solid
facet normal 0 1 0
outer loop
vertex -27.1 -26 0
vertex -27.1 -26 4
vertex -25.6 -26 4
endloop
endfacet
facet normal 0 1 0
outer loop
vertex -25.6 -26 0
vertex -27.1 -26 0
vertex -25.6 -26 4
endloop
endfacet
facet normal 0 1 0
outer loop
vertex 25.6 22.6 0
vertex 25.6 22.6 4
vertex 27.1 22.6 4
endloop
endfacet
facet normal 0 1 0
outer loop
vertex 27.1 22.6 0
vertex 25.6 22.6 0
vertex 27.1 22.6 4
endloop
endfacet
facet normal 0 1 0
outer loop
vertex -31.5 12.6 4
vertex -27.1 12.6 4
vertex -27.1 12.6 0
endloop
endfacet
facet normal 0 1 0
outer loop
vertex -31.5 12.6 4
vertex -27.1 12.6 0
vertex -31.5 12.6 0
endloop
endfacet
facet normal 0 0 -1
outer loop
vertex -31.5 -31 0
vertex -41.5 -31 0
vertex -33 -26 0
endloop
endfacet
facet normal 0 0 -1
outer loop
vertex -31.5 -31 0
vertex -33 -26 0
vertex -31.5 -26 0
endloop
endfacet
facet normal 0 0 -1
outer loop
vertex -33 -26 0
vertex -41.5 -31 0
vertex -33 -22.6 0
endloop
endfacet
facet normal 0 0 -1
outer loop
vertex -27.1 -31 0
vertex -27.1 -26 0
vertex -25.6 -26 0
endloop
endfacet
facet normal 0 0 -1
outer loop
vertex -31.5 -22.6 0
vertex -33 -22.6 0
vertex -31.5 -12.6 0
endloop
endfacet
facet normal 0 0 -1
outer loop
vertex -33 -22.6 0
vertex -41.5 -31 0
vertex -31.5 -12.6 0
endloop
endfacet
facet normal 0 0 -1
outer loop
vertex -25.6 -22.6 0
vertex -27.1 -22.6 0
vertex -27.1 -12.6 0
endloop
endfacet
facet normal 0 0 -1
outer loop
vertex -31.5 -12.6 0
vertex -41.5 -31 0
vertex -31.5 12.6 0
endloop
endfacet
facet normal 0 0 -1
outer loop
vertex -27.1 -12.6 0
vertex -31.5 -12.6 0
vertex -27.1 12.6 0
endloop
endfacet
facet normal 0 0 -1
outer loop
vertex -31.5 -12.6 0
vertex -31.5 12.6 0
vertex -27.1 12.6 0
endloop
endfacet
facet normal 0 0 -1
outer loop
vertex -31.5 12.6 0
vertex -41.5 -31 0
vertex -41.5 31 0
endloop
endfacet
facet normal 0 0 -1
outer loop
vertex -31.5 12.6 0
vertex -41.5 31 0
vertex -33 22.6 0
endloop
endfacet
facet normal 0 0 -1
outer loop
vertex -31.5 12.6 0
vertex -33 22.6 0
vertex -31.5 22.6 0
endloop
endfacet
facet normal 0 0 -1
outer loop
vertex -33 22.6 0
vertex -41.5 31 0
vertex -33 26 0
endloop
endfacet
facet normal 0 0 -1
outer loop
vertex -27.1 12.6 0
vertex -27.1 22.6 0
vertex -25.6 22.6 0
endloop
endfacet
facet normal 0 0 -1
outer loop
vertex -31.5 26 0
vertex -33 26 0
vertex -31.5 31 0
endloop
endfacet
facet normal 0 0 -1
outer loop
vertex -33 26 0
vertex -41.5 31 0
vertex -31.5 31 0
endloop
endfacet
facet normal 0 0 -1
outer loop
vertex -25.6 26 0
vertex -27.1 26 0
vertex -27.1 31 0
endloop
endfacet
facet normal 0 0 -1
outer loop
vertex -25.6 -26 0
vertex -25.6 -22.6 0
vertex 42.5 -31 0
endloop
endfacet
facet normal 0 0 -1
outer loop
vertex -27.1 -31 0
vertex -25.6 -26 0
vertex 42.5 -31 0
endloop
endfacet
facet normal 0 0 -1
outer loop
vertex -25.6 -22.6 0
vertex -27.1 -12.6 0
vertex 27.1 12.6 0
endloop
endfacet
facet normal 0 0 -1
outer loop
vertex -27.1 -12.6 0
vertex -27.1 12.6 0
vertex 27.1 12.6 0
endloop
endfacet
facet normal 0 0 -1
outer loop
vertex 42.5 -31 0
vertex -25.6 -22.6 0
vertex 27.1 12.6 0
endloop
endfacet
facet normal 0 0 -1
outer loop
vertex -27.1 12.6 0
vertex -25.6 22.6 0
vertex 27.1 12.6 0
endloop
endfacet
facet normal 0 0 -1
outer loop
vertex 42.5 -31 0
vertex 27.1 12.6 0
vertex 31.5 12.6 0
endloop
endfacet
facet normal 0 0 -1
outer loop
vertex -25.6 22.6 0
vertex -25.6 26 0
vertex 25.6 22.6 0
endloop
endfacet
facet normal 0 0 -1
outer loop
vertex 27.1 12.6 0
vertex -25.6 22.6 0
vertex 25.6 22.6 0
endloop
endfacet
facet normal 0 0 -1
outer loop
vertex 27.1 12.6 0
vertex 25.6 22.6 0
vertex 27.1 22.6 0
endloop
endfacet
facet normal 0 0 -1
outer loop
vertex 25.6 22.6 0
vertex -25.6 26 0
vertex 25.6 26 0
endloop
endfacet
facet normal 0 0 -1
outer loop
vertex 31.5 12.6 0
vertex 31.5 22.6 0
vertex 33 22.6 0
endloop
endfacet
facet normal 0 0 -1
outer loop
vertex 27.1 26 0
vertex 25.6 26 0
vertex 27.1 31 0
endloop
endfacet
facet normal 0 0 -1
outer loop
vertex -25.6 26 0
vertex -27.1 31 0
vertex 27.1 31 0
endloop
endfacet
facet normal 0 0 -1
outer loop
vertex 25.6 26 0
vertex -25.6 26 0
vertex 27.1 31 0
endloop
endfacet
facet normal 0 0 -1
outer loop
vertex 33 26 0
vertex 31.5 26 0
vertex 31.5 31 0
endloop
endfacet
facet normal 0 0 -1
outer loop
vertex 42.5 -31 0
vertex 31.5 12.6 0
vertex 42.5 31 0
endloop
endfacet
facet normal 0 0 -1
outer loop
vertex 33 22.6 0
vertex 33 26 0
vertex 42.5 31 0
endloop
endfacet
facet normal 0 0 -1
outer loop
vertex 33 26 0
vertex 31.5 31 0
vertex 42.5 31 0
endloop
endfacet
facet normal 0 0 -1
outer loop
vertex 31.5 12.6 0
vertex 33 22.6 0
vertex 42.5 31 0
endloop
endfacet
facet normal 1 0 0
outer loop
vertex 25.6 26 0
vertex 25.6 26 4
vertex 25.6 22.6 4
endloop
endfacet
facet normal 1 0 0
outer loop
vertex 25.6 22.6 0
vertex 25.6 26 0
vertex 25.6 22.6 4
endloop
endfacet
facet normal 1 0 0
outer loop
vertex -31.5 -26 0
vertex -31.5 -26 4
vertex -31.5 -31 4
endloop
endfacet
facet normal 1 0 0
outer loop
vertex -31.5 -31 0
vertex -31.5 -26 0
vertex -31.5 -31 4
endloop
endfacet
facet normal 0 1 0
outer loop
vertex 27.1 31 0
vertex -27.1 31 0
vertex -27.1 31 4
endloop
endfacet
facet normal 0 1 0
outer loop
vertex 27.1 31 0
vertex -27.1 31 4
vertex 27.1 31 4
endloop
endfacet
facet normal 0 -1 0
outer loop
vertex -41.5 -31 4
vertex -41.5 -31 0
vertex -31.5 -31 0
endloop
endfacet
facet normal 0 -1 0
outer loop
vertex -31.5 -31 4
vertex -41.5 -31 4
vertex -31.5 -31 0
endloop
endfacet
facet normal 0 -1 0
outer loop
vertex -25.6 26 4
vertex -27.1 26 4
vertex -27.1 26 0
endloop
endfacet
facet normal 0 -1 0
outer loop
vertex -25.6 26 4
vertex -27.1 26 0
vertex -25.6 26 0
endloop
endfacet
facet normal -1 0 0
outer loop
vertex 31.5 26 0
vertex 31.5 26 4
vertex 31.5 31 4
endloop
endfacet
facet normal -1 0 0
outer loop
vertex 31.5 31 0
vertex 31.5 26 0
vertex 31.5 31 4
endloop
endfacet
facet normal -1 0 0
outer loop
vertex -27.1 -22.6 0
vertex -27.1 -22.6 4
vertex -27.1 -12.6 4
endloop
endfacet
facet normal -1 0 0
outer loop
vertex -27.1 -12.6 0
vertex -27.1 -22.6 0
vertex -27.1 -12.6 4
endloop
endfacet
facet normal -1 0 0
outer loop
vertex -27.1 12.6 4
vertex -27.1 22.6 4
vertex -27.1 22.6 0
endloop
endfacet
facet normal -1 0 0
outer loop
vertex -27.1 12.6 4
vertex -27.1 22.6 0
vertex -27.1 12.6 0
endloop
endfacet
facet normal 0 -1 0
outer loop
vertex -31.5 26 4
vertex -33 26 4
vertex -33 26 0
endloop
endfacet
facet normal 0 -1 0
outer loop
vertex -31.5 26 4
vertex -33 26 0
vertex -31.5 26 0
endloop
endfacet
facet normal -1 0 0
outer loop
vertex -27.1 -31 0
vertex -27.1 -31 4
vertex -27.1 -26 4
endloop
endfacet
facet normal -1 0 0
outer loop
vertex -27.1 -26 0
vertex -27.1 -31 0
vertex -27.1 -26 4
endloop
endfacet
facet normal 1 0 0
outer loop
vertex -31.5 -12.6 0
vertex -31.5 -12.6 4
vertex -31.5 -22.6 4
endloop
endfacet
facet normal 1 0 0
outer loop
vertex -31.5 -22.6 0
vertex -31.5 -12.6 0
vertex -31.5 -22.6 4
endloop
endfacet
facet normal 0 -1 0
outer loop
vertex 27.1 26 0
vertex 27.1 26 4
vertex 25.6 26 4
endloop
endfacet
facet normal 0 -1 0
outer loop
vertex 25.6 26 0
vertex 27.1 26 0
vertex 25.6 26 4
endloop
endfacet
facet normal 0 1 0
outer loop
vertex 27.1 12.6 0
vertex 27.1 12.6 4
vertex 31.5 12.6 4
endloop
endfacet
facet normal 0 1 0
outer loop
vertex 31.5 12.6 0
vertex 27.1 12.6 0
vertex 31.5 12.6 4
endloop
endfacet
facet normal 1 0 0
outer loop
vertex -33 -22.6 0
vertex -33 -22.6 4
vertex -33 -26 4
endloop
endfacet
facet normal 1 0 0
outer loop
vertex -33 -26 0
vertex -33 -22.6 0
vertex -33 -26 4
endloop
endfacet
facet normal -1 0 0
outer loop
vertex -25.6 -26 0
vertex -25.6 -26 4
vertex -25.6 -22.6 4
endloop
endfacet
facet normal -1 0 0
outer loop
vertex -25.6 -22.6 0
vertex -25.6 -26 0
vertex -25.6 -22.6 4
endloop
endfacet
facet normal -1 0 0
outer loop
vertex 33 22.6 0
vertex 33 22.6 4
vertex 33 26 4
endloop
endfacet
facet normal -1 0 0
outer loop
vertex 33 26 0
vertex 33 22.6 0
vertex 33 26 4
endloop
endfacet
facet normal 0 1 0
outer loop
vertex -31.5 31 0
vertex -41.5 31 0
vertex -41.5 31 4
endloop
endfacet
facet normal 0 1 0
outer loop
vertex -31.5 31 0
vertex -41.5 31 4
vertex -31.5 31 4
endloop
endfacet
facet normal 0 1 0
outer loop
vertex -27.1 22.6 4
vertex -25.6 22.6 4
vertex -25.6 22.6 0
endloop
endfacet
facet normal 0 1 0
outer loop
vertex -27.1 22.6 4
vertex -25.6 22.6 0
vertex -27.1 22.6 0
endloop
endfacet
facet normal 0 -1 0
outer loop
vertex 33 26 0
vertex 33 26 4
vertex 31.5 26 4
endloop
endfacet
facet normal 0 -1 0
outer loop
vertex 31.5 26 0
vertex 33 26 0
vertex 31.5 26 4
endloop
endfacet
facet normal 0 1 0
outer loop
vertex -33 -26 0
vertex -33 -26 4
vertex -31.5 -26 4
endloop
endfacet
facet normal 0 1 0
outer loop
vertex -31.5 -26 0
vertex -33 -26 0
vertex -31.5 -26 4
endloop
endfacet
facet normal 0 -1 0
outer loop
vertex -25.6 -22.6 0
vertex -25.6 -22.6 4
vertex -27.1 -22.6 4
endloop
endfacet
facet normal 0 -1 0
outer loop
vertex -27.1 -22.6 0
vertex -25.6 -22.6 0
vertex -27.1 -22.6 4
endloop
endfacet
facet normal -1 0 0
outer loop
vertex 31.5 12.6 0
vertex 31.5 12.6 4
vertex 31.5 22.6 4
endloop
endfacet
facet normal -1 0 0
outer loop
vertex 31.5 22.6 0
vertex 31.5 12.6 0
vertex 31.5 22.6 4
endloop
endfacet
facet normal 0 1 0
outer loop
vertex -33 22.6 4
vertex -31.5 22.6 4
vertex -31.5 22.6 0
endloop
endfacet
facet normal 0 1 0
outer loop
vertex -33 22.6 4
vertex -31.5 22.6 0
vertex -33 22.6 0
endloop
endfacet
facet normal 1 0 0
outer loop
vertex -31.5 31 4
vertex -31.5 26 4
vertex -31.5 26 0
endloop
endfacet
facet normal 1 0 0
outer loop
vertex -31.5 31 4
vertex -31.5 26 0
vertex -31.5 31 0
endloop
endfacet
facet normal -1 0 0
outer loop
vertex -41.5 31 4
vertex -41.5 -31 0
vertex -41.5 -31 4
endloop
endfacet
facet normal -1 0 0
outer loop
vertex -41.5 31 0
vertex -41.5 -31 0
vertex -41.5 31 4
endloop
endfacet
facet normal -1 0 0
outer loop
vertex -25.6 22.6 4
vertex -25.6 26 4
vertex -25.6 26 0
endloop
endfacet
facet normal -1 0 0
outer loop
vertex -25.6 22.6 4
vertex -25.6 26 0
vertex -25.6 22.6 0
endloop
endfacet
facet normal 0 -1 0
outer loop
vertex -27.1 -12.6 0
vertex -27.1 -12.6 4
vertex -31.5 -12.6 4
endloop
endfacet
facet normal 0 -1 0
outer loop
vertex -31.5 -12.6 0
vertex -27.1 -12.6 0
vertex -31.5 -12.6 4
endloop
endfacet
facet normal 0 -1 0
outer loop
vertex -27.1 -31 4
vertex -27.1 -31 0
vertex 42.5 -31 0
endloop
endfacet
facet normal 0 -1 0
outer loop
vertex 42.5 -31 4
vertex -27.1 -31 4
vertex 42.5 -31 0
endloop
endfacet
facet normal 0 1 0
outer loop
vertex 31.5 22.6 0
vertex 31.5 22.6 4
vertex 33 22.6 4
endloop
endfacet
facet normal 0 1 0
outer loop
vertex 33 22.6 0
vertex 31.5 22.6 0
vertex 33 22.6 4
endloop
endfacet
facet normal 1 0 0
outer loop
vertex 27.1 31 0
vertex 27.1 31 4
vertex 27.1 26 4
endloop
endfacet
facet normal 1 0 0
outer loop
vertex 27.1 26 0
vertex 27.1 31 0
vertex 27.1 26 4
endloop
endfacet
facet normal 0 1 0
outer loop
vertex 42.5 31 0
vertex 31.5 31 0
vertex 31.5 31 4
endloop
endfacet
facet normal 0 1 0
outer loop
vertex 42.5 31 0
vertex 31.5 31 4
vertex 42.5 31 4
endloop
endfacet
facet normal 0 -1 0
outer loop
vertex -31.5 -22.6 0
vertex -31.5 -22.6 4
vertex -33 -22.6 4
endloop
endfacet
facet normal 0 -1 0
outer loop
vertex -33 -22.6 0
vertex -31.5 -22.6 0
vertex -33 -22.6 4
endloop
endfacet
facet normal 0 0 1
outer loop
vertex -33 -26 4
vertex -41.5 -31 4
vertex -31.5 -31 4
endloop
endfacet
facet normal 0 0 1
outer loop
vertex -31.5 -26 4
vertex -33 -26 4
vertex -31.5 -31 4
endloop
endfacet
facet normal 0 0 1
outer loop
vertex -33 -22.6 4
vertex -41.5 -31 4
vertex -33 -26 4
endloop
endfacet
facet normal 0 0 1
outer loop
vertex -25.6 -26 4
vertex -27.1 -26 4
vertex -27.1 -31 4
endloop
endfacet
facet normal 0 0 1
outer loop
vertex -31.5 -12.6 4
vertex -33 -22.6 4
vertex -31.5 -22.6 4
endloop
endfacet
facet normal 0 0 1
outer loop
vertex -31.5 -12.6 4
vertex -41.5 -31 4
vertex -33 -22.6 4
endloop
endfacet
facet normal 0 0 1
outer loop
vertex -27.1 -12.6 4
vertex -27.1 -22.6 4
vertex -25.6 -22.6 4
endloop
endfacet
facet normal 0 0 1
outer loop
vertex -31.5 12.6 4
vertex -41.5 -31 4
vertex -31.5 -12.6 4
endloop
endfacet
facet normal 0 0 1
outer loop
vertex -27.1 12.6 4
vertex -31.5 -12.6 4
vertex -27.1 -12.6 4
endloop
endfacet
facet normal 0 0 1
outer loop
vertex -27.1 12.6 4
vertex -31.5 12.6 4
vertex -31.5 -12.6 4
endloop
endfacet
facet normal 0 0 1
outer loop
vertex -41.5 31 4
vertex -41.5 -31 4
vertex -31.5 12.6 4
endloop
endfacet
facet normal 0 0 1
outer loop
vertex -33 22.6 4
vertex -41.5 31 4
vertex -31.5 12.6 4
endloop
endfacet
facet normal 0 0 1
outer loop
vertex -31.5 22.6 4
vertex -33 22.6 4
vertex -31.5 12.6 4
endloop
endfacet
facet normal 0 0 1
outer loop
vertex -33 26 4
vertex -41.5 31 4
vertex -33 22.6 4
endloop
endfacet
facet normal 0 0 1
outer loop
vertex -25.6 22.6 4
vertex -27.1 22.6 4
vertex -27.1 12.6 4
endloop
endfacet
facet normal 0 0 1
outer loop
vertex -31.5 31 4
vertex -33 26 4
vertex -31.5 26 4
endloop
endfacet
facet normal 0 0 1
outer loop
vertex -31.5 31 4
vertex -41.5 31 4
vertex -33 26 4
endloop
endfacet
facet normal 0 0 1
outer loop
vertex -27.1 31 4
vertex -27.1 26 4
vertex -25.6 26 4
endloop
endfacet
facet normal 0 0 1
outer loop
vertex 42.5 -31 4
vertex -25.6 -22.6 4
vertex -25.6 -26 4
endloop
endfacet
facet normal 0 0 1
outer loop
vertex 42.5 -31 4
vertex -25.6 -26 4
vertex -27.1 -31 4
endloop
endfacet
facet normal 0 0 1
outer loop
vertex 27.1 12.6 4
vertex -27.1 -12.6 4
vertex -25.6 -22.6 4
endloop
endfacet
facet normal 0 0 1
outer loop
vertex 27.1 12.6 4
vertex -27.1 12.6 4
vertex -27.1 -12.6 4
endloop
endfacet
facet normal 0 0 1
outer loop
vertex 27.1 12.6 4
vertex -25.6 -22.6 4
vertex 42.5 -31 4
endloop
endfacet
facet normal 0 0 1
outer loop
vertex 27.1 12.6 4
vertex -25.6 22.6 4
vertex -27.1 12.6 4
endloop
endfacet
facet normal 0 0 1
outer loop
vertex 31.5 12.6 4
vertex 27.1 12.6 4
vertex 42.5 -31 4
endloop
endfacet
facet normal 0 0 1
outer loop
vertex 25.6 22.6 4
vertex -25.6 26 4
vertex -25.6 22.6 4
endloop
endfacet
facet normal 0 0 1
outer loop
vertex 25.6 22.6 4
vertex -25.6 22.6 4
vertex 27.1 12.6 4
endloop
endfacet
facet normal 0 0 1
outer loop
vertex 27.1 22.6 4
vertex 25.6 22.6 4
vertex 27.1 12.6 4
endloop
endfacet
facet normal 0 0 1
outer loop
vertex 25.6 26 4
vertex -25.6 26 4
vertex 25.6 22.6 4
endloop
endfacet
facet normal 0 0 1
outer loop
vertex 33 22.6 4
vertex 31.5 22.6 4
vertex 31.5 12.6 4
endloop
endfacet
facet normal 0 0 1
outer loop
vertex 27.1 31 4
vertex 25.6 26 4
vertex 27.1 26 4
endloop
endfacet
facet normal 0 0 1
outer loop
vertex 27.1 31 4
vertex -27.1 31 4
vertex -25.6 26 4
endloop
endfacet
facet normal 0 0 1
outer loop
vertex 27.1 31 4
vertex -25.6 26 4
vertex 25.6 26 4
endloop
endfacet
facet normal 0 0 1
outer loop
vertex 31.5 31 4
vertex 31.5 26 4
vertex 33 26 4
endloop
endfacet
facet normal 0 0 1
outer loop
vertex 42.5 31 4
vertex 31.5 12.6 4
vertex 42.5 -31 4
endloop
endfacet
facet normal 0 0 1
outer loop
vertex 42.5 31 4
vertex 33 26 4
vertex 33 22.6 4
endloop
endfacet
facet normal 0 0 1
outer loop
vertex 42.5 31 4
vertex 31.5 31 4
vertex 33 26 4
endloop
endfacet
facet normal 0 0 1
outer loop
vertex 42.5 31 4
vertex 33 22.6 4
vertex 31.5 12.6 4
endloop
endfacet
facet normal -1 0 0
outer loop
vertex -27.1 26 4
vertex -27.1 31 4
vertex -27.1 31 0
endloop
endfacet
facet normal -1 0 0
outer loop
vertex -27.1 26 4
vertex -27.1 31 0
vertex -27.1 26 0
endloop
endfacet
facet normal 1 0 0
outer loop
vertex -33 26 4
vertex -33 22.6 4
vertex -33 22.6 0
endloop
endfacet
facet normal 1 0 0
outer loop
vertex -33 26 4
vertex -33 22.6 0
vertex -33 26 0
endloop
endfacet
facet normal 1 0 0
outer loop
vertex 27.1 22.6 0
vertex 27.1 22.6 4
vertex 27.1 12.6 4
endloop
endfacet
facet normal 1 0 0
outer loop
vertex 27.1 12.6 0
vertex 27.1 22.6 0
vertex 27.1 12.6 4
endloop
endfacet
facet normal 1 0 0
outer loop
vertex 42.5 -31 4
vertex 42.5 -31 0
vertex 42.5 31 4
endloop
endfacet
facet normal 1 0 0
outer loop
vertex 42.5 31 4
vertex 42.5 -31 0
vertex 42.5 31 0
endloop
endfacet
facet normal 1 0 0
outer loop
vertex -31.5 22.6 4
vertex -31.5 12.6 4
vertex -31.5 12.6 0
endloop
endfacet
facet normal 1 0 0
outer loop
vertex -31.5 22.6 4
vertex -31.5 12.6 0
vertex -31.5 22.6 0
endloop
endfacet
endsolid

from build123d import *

# Parameters (mm, degrees)
SKETCH1_W           = 84
SKETCH1_H           = 62
BOSS_EXTRUDE1_DEPTH = 4
CUT_EXTRUDE2_DEPTH  = 5


with BuildPart() as part:
    # Sketch1 → Boss-Extrude1 (new body)
    with BuildSketch(Plane.XY):
        with Locations((0.5, 0)):
            Rectangle(SKETCH1_W, SKETCH1_H)
    extrude(amount=BOSS_EXTRUDE1_DEPTH)

    # Sketch3 → Cut-Extrude2 (cut)
    with BuildSketch(Plane.XY.offset(4)):
        Polygon((-27.1, 22.6), (-27.1, 12.6), (-31.5, 12.6), (-31.5, 22.6), (-33, 22.6), (-33, 26), (-31.5, 26), (-31.5, 31), (-27.1, 31), (-27.1, 26), (-25.6, 26), (-25.6, 22.6), align=None)
        Polygon((31.5, 12.6), (31.5, 22.6), (33, 22.6), (33, 26), (31.5, 26), (31.5, 31), (27.1, 31), (27.1, 26), (25.6, 26), (25.6, 22.6), (27.1, 22.6), (27.1, 12.6), align=None)
        Polygon((-31.5, -12.6), (-31.5, -22.6), (-33, -22.6), (-33, -26), (-31.5, -26), (-31.5, -31), (-27.1, -31), (-27.1, -26), (-25.6, -26), (-25.6, -22.6), (-27.1, -22.6), (-27.1, -12.6), align=None)
    extrude(amount=-CUT_EXTRUDE2_DEPTH, mode=Mode.SUBTRACT)


solid = part.part
